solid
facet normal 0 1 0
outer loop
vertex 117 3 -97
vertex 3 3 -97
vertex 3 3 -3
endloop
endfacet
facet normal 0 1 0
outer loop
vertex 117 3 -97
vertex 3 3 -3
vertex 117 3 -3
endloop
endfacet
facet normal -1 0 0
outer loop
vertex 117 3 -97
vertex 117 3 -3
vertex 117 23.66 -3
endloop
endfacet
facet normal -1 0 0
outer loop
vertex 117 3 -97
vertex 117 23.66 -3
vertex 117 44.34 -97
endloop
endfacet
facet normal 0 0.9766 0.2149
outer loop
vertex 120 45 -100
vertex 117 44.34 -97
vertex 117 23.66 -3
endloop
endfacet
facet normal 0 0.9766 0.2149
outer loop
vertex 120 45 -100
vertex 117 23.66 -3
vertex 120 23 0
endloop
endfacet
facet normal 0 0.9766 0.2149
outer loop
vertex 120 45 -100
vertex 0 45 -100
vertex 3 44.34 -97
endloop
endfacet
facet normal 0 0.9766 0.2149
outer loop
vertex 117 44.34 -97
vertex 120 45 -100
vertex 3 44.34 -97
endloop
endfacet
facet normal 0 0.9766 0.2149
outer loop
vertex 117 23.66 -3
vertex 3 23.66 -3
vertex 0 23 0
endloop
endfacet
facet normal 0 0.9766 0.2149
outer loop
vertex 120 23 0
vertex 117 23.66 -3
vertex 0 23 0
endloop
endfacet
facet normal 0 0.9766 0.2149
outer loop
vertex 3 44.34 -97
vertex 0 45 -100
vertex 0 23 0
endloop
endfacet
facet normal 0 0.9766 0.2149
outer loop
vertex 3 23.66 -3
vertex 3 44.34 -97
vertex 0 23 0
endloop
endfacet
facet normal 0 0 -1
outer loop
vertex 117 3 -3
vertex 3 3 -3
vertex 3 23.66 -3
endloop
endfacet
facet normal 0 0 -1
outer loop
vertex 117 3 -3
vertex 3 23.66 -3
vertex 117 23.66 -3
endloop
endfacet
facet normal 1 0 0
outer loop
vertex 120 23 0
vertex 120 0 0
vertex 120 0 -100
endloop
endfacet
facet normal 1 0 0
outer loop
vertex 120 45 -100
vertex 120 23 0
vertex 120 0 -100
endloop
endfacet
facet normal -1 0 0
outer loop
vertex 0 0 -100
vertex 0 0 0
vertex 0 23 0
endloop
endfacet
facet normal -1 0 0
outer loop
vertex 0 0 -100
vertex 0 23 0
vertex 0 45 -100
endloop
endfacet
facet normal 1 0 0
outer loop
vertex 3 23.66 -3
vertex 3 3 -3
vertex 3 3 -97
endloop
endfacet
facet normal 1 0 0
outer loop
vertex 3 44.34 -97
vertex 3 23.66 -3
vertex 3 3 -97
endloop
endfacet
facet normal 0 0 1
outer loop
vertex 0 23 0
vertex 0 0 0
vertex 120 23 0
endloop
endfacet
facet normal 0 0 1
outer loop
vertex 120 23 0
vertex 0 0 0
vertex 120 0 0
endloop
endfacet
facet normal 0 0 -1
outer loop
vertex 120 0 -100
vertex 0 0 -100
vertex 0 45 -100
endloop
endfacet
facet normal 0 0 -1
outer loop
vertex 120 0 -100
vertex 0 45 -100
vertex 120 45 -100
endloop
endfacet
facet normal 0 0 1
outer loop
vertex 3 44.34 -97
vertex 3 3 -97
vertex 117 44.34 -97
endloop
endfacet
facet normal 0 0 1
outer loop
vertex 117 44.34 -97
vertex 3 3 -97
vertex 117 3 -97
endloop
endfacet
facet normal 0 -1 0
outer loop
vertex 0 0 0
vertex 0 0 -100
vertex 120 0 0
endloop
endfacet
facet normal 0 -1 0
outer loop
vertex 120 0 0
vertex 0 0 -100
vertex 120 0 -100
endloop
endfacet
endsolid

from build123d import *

# Parameters (mm, degrees)
SKETCH1_W               = 120
SKETCH1_H               = 100
BOSS_EXTRUDE1_DEPTH     = 45
CUT_EXTRUDE1_DEPTH      = 163.55768207
CUT_EXTRUDE1_DEPTH_BACK = 163.55768207
SHELL1_T                = -3


with BuildPart() as part:
    # Sketch1 → Boss-Extrude1 (new body)
    with BuildSketch(Plane(origin=(0, 0, 0), x_dir=(1, 0, 0), z_dir=(0, 1, 0))):
        with Locations((60, 50)):
            Rectangle(SKETCH1_W, SKETCH1_H)
    extrude(amount=BOSS_EXTRUDE1_DEPTH)

    # Sketch2 → Cut-Extrude1 (cut, two sides: drawn at the far end of the back side and taken through both)
    with BuildSketch(Plane(origin=(120, 0, 0), x_dir=(0, 0, -1), z_dir=(1, 0, 0)).offset(-CUT_EXTRUDE1_DEPTH_BACK)):
        Polygon((0, 23), (0, 45), (100, 45), align=None)
    extrude(amount=CUT_EXTRUDE1_DEPTH + CUT_EXTRUDE1_DEPTH_BACK, mode=Mode.SUBTRACT)

    # Shell1
    shell1_openings = [part.faces().sort_by_distance(p)[0] for p in [
        (60, 34, -50),
    ]]
    offset(amount=SHELL1_T, openings=shell1_openings, kind=Kind.INTERSECTION)


solid = part.part
